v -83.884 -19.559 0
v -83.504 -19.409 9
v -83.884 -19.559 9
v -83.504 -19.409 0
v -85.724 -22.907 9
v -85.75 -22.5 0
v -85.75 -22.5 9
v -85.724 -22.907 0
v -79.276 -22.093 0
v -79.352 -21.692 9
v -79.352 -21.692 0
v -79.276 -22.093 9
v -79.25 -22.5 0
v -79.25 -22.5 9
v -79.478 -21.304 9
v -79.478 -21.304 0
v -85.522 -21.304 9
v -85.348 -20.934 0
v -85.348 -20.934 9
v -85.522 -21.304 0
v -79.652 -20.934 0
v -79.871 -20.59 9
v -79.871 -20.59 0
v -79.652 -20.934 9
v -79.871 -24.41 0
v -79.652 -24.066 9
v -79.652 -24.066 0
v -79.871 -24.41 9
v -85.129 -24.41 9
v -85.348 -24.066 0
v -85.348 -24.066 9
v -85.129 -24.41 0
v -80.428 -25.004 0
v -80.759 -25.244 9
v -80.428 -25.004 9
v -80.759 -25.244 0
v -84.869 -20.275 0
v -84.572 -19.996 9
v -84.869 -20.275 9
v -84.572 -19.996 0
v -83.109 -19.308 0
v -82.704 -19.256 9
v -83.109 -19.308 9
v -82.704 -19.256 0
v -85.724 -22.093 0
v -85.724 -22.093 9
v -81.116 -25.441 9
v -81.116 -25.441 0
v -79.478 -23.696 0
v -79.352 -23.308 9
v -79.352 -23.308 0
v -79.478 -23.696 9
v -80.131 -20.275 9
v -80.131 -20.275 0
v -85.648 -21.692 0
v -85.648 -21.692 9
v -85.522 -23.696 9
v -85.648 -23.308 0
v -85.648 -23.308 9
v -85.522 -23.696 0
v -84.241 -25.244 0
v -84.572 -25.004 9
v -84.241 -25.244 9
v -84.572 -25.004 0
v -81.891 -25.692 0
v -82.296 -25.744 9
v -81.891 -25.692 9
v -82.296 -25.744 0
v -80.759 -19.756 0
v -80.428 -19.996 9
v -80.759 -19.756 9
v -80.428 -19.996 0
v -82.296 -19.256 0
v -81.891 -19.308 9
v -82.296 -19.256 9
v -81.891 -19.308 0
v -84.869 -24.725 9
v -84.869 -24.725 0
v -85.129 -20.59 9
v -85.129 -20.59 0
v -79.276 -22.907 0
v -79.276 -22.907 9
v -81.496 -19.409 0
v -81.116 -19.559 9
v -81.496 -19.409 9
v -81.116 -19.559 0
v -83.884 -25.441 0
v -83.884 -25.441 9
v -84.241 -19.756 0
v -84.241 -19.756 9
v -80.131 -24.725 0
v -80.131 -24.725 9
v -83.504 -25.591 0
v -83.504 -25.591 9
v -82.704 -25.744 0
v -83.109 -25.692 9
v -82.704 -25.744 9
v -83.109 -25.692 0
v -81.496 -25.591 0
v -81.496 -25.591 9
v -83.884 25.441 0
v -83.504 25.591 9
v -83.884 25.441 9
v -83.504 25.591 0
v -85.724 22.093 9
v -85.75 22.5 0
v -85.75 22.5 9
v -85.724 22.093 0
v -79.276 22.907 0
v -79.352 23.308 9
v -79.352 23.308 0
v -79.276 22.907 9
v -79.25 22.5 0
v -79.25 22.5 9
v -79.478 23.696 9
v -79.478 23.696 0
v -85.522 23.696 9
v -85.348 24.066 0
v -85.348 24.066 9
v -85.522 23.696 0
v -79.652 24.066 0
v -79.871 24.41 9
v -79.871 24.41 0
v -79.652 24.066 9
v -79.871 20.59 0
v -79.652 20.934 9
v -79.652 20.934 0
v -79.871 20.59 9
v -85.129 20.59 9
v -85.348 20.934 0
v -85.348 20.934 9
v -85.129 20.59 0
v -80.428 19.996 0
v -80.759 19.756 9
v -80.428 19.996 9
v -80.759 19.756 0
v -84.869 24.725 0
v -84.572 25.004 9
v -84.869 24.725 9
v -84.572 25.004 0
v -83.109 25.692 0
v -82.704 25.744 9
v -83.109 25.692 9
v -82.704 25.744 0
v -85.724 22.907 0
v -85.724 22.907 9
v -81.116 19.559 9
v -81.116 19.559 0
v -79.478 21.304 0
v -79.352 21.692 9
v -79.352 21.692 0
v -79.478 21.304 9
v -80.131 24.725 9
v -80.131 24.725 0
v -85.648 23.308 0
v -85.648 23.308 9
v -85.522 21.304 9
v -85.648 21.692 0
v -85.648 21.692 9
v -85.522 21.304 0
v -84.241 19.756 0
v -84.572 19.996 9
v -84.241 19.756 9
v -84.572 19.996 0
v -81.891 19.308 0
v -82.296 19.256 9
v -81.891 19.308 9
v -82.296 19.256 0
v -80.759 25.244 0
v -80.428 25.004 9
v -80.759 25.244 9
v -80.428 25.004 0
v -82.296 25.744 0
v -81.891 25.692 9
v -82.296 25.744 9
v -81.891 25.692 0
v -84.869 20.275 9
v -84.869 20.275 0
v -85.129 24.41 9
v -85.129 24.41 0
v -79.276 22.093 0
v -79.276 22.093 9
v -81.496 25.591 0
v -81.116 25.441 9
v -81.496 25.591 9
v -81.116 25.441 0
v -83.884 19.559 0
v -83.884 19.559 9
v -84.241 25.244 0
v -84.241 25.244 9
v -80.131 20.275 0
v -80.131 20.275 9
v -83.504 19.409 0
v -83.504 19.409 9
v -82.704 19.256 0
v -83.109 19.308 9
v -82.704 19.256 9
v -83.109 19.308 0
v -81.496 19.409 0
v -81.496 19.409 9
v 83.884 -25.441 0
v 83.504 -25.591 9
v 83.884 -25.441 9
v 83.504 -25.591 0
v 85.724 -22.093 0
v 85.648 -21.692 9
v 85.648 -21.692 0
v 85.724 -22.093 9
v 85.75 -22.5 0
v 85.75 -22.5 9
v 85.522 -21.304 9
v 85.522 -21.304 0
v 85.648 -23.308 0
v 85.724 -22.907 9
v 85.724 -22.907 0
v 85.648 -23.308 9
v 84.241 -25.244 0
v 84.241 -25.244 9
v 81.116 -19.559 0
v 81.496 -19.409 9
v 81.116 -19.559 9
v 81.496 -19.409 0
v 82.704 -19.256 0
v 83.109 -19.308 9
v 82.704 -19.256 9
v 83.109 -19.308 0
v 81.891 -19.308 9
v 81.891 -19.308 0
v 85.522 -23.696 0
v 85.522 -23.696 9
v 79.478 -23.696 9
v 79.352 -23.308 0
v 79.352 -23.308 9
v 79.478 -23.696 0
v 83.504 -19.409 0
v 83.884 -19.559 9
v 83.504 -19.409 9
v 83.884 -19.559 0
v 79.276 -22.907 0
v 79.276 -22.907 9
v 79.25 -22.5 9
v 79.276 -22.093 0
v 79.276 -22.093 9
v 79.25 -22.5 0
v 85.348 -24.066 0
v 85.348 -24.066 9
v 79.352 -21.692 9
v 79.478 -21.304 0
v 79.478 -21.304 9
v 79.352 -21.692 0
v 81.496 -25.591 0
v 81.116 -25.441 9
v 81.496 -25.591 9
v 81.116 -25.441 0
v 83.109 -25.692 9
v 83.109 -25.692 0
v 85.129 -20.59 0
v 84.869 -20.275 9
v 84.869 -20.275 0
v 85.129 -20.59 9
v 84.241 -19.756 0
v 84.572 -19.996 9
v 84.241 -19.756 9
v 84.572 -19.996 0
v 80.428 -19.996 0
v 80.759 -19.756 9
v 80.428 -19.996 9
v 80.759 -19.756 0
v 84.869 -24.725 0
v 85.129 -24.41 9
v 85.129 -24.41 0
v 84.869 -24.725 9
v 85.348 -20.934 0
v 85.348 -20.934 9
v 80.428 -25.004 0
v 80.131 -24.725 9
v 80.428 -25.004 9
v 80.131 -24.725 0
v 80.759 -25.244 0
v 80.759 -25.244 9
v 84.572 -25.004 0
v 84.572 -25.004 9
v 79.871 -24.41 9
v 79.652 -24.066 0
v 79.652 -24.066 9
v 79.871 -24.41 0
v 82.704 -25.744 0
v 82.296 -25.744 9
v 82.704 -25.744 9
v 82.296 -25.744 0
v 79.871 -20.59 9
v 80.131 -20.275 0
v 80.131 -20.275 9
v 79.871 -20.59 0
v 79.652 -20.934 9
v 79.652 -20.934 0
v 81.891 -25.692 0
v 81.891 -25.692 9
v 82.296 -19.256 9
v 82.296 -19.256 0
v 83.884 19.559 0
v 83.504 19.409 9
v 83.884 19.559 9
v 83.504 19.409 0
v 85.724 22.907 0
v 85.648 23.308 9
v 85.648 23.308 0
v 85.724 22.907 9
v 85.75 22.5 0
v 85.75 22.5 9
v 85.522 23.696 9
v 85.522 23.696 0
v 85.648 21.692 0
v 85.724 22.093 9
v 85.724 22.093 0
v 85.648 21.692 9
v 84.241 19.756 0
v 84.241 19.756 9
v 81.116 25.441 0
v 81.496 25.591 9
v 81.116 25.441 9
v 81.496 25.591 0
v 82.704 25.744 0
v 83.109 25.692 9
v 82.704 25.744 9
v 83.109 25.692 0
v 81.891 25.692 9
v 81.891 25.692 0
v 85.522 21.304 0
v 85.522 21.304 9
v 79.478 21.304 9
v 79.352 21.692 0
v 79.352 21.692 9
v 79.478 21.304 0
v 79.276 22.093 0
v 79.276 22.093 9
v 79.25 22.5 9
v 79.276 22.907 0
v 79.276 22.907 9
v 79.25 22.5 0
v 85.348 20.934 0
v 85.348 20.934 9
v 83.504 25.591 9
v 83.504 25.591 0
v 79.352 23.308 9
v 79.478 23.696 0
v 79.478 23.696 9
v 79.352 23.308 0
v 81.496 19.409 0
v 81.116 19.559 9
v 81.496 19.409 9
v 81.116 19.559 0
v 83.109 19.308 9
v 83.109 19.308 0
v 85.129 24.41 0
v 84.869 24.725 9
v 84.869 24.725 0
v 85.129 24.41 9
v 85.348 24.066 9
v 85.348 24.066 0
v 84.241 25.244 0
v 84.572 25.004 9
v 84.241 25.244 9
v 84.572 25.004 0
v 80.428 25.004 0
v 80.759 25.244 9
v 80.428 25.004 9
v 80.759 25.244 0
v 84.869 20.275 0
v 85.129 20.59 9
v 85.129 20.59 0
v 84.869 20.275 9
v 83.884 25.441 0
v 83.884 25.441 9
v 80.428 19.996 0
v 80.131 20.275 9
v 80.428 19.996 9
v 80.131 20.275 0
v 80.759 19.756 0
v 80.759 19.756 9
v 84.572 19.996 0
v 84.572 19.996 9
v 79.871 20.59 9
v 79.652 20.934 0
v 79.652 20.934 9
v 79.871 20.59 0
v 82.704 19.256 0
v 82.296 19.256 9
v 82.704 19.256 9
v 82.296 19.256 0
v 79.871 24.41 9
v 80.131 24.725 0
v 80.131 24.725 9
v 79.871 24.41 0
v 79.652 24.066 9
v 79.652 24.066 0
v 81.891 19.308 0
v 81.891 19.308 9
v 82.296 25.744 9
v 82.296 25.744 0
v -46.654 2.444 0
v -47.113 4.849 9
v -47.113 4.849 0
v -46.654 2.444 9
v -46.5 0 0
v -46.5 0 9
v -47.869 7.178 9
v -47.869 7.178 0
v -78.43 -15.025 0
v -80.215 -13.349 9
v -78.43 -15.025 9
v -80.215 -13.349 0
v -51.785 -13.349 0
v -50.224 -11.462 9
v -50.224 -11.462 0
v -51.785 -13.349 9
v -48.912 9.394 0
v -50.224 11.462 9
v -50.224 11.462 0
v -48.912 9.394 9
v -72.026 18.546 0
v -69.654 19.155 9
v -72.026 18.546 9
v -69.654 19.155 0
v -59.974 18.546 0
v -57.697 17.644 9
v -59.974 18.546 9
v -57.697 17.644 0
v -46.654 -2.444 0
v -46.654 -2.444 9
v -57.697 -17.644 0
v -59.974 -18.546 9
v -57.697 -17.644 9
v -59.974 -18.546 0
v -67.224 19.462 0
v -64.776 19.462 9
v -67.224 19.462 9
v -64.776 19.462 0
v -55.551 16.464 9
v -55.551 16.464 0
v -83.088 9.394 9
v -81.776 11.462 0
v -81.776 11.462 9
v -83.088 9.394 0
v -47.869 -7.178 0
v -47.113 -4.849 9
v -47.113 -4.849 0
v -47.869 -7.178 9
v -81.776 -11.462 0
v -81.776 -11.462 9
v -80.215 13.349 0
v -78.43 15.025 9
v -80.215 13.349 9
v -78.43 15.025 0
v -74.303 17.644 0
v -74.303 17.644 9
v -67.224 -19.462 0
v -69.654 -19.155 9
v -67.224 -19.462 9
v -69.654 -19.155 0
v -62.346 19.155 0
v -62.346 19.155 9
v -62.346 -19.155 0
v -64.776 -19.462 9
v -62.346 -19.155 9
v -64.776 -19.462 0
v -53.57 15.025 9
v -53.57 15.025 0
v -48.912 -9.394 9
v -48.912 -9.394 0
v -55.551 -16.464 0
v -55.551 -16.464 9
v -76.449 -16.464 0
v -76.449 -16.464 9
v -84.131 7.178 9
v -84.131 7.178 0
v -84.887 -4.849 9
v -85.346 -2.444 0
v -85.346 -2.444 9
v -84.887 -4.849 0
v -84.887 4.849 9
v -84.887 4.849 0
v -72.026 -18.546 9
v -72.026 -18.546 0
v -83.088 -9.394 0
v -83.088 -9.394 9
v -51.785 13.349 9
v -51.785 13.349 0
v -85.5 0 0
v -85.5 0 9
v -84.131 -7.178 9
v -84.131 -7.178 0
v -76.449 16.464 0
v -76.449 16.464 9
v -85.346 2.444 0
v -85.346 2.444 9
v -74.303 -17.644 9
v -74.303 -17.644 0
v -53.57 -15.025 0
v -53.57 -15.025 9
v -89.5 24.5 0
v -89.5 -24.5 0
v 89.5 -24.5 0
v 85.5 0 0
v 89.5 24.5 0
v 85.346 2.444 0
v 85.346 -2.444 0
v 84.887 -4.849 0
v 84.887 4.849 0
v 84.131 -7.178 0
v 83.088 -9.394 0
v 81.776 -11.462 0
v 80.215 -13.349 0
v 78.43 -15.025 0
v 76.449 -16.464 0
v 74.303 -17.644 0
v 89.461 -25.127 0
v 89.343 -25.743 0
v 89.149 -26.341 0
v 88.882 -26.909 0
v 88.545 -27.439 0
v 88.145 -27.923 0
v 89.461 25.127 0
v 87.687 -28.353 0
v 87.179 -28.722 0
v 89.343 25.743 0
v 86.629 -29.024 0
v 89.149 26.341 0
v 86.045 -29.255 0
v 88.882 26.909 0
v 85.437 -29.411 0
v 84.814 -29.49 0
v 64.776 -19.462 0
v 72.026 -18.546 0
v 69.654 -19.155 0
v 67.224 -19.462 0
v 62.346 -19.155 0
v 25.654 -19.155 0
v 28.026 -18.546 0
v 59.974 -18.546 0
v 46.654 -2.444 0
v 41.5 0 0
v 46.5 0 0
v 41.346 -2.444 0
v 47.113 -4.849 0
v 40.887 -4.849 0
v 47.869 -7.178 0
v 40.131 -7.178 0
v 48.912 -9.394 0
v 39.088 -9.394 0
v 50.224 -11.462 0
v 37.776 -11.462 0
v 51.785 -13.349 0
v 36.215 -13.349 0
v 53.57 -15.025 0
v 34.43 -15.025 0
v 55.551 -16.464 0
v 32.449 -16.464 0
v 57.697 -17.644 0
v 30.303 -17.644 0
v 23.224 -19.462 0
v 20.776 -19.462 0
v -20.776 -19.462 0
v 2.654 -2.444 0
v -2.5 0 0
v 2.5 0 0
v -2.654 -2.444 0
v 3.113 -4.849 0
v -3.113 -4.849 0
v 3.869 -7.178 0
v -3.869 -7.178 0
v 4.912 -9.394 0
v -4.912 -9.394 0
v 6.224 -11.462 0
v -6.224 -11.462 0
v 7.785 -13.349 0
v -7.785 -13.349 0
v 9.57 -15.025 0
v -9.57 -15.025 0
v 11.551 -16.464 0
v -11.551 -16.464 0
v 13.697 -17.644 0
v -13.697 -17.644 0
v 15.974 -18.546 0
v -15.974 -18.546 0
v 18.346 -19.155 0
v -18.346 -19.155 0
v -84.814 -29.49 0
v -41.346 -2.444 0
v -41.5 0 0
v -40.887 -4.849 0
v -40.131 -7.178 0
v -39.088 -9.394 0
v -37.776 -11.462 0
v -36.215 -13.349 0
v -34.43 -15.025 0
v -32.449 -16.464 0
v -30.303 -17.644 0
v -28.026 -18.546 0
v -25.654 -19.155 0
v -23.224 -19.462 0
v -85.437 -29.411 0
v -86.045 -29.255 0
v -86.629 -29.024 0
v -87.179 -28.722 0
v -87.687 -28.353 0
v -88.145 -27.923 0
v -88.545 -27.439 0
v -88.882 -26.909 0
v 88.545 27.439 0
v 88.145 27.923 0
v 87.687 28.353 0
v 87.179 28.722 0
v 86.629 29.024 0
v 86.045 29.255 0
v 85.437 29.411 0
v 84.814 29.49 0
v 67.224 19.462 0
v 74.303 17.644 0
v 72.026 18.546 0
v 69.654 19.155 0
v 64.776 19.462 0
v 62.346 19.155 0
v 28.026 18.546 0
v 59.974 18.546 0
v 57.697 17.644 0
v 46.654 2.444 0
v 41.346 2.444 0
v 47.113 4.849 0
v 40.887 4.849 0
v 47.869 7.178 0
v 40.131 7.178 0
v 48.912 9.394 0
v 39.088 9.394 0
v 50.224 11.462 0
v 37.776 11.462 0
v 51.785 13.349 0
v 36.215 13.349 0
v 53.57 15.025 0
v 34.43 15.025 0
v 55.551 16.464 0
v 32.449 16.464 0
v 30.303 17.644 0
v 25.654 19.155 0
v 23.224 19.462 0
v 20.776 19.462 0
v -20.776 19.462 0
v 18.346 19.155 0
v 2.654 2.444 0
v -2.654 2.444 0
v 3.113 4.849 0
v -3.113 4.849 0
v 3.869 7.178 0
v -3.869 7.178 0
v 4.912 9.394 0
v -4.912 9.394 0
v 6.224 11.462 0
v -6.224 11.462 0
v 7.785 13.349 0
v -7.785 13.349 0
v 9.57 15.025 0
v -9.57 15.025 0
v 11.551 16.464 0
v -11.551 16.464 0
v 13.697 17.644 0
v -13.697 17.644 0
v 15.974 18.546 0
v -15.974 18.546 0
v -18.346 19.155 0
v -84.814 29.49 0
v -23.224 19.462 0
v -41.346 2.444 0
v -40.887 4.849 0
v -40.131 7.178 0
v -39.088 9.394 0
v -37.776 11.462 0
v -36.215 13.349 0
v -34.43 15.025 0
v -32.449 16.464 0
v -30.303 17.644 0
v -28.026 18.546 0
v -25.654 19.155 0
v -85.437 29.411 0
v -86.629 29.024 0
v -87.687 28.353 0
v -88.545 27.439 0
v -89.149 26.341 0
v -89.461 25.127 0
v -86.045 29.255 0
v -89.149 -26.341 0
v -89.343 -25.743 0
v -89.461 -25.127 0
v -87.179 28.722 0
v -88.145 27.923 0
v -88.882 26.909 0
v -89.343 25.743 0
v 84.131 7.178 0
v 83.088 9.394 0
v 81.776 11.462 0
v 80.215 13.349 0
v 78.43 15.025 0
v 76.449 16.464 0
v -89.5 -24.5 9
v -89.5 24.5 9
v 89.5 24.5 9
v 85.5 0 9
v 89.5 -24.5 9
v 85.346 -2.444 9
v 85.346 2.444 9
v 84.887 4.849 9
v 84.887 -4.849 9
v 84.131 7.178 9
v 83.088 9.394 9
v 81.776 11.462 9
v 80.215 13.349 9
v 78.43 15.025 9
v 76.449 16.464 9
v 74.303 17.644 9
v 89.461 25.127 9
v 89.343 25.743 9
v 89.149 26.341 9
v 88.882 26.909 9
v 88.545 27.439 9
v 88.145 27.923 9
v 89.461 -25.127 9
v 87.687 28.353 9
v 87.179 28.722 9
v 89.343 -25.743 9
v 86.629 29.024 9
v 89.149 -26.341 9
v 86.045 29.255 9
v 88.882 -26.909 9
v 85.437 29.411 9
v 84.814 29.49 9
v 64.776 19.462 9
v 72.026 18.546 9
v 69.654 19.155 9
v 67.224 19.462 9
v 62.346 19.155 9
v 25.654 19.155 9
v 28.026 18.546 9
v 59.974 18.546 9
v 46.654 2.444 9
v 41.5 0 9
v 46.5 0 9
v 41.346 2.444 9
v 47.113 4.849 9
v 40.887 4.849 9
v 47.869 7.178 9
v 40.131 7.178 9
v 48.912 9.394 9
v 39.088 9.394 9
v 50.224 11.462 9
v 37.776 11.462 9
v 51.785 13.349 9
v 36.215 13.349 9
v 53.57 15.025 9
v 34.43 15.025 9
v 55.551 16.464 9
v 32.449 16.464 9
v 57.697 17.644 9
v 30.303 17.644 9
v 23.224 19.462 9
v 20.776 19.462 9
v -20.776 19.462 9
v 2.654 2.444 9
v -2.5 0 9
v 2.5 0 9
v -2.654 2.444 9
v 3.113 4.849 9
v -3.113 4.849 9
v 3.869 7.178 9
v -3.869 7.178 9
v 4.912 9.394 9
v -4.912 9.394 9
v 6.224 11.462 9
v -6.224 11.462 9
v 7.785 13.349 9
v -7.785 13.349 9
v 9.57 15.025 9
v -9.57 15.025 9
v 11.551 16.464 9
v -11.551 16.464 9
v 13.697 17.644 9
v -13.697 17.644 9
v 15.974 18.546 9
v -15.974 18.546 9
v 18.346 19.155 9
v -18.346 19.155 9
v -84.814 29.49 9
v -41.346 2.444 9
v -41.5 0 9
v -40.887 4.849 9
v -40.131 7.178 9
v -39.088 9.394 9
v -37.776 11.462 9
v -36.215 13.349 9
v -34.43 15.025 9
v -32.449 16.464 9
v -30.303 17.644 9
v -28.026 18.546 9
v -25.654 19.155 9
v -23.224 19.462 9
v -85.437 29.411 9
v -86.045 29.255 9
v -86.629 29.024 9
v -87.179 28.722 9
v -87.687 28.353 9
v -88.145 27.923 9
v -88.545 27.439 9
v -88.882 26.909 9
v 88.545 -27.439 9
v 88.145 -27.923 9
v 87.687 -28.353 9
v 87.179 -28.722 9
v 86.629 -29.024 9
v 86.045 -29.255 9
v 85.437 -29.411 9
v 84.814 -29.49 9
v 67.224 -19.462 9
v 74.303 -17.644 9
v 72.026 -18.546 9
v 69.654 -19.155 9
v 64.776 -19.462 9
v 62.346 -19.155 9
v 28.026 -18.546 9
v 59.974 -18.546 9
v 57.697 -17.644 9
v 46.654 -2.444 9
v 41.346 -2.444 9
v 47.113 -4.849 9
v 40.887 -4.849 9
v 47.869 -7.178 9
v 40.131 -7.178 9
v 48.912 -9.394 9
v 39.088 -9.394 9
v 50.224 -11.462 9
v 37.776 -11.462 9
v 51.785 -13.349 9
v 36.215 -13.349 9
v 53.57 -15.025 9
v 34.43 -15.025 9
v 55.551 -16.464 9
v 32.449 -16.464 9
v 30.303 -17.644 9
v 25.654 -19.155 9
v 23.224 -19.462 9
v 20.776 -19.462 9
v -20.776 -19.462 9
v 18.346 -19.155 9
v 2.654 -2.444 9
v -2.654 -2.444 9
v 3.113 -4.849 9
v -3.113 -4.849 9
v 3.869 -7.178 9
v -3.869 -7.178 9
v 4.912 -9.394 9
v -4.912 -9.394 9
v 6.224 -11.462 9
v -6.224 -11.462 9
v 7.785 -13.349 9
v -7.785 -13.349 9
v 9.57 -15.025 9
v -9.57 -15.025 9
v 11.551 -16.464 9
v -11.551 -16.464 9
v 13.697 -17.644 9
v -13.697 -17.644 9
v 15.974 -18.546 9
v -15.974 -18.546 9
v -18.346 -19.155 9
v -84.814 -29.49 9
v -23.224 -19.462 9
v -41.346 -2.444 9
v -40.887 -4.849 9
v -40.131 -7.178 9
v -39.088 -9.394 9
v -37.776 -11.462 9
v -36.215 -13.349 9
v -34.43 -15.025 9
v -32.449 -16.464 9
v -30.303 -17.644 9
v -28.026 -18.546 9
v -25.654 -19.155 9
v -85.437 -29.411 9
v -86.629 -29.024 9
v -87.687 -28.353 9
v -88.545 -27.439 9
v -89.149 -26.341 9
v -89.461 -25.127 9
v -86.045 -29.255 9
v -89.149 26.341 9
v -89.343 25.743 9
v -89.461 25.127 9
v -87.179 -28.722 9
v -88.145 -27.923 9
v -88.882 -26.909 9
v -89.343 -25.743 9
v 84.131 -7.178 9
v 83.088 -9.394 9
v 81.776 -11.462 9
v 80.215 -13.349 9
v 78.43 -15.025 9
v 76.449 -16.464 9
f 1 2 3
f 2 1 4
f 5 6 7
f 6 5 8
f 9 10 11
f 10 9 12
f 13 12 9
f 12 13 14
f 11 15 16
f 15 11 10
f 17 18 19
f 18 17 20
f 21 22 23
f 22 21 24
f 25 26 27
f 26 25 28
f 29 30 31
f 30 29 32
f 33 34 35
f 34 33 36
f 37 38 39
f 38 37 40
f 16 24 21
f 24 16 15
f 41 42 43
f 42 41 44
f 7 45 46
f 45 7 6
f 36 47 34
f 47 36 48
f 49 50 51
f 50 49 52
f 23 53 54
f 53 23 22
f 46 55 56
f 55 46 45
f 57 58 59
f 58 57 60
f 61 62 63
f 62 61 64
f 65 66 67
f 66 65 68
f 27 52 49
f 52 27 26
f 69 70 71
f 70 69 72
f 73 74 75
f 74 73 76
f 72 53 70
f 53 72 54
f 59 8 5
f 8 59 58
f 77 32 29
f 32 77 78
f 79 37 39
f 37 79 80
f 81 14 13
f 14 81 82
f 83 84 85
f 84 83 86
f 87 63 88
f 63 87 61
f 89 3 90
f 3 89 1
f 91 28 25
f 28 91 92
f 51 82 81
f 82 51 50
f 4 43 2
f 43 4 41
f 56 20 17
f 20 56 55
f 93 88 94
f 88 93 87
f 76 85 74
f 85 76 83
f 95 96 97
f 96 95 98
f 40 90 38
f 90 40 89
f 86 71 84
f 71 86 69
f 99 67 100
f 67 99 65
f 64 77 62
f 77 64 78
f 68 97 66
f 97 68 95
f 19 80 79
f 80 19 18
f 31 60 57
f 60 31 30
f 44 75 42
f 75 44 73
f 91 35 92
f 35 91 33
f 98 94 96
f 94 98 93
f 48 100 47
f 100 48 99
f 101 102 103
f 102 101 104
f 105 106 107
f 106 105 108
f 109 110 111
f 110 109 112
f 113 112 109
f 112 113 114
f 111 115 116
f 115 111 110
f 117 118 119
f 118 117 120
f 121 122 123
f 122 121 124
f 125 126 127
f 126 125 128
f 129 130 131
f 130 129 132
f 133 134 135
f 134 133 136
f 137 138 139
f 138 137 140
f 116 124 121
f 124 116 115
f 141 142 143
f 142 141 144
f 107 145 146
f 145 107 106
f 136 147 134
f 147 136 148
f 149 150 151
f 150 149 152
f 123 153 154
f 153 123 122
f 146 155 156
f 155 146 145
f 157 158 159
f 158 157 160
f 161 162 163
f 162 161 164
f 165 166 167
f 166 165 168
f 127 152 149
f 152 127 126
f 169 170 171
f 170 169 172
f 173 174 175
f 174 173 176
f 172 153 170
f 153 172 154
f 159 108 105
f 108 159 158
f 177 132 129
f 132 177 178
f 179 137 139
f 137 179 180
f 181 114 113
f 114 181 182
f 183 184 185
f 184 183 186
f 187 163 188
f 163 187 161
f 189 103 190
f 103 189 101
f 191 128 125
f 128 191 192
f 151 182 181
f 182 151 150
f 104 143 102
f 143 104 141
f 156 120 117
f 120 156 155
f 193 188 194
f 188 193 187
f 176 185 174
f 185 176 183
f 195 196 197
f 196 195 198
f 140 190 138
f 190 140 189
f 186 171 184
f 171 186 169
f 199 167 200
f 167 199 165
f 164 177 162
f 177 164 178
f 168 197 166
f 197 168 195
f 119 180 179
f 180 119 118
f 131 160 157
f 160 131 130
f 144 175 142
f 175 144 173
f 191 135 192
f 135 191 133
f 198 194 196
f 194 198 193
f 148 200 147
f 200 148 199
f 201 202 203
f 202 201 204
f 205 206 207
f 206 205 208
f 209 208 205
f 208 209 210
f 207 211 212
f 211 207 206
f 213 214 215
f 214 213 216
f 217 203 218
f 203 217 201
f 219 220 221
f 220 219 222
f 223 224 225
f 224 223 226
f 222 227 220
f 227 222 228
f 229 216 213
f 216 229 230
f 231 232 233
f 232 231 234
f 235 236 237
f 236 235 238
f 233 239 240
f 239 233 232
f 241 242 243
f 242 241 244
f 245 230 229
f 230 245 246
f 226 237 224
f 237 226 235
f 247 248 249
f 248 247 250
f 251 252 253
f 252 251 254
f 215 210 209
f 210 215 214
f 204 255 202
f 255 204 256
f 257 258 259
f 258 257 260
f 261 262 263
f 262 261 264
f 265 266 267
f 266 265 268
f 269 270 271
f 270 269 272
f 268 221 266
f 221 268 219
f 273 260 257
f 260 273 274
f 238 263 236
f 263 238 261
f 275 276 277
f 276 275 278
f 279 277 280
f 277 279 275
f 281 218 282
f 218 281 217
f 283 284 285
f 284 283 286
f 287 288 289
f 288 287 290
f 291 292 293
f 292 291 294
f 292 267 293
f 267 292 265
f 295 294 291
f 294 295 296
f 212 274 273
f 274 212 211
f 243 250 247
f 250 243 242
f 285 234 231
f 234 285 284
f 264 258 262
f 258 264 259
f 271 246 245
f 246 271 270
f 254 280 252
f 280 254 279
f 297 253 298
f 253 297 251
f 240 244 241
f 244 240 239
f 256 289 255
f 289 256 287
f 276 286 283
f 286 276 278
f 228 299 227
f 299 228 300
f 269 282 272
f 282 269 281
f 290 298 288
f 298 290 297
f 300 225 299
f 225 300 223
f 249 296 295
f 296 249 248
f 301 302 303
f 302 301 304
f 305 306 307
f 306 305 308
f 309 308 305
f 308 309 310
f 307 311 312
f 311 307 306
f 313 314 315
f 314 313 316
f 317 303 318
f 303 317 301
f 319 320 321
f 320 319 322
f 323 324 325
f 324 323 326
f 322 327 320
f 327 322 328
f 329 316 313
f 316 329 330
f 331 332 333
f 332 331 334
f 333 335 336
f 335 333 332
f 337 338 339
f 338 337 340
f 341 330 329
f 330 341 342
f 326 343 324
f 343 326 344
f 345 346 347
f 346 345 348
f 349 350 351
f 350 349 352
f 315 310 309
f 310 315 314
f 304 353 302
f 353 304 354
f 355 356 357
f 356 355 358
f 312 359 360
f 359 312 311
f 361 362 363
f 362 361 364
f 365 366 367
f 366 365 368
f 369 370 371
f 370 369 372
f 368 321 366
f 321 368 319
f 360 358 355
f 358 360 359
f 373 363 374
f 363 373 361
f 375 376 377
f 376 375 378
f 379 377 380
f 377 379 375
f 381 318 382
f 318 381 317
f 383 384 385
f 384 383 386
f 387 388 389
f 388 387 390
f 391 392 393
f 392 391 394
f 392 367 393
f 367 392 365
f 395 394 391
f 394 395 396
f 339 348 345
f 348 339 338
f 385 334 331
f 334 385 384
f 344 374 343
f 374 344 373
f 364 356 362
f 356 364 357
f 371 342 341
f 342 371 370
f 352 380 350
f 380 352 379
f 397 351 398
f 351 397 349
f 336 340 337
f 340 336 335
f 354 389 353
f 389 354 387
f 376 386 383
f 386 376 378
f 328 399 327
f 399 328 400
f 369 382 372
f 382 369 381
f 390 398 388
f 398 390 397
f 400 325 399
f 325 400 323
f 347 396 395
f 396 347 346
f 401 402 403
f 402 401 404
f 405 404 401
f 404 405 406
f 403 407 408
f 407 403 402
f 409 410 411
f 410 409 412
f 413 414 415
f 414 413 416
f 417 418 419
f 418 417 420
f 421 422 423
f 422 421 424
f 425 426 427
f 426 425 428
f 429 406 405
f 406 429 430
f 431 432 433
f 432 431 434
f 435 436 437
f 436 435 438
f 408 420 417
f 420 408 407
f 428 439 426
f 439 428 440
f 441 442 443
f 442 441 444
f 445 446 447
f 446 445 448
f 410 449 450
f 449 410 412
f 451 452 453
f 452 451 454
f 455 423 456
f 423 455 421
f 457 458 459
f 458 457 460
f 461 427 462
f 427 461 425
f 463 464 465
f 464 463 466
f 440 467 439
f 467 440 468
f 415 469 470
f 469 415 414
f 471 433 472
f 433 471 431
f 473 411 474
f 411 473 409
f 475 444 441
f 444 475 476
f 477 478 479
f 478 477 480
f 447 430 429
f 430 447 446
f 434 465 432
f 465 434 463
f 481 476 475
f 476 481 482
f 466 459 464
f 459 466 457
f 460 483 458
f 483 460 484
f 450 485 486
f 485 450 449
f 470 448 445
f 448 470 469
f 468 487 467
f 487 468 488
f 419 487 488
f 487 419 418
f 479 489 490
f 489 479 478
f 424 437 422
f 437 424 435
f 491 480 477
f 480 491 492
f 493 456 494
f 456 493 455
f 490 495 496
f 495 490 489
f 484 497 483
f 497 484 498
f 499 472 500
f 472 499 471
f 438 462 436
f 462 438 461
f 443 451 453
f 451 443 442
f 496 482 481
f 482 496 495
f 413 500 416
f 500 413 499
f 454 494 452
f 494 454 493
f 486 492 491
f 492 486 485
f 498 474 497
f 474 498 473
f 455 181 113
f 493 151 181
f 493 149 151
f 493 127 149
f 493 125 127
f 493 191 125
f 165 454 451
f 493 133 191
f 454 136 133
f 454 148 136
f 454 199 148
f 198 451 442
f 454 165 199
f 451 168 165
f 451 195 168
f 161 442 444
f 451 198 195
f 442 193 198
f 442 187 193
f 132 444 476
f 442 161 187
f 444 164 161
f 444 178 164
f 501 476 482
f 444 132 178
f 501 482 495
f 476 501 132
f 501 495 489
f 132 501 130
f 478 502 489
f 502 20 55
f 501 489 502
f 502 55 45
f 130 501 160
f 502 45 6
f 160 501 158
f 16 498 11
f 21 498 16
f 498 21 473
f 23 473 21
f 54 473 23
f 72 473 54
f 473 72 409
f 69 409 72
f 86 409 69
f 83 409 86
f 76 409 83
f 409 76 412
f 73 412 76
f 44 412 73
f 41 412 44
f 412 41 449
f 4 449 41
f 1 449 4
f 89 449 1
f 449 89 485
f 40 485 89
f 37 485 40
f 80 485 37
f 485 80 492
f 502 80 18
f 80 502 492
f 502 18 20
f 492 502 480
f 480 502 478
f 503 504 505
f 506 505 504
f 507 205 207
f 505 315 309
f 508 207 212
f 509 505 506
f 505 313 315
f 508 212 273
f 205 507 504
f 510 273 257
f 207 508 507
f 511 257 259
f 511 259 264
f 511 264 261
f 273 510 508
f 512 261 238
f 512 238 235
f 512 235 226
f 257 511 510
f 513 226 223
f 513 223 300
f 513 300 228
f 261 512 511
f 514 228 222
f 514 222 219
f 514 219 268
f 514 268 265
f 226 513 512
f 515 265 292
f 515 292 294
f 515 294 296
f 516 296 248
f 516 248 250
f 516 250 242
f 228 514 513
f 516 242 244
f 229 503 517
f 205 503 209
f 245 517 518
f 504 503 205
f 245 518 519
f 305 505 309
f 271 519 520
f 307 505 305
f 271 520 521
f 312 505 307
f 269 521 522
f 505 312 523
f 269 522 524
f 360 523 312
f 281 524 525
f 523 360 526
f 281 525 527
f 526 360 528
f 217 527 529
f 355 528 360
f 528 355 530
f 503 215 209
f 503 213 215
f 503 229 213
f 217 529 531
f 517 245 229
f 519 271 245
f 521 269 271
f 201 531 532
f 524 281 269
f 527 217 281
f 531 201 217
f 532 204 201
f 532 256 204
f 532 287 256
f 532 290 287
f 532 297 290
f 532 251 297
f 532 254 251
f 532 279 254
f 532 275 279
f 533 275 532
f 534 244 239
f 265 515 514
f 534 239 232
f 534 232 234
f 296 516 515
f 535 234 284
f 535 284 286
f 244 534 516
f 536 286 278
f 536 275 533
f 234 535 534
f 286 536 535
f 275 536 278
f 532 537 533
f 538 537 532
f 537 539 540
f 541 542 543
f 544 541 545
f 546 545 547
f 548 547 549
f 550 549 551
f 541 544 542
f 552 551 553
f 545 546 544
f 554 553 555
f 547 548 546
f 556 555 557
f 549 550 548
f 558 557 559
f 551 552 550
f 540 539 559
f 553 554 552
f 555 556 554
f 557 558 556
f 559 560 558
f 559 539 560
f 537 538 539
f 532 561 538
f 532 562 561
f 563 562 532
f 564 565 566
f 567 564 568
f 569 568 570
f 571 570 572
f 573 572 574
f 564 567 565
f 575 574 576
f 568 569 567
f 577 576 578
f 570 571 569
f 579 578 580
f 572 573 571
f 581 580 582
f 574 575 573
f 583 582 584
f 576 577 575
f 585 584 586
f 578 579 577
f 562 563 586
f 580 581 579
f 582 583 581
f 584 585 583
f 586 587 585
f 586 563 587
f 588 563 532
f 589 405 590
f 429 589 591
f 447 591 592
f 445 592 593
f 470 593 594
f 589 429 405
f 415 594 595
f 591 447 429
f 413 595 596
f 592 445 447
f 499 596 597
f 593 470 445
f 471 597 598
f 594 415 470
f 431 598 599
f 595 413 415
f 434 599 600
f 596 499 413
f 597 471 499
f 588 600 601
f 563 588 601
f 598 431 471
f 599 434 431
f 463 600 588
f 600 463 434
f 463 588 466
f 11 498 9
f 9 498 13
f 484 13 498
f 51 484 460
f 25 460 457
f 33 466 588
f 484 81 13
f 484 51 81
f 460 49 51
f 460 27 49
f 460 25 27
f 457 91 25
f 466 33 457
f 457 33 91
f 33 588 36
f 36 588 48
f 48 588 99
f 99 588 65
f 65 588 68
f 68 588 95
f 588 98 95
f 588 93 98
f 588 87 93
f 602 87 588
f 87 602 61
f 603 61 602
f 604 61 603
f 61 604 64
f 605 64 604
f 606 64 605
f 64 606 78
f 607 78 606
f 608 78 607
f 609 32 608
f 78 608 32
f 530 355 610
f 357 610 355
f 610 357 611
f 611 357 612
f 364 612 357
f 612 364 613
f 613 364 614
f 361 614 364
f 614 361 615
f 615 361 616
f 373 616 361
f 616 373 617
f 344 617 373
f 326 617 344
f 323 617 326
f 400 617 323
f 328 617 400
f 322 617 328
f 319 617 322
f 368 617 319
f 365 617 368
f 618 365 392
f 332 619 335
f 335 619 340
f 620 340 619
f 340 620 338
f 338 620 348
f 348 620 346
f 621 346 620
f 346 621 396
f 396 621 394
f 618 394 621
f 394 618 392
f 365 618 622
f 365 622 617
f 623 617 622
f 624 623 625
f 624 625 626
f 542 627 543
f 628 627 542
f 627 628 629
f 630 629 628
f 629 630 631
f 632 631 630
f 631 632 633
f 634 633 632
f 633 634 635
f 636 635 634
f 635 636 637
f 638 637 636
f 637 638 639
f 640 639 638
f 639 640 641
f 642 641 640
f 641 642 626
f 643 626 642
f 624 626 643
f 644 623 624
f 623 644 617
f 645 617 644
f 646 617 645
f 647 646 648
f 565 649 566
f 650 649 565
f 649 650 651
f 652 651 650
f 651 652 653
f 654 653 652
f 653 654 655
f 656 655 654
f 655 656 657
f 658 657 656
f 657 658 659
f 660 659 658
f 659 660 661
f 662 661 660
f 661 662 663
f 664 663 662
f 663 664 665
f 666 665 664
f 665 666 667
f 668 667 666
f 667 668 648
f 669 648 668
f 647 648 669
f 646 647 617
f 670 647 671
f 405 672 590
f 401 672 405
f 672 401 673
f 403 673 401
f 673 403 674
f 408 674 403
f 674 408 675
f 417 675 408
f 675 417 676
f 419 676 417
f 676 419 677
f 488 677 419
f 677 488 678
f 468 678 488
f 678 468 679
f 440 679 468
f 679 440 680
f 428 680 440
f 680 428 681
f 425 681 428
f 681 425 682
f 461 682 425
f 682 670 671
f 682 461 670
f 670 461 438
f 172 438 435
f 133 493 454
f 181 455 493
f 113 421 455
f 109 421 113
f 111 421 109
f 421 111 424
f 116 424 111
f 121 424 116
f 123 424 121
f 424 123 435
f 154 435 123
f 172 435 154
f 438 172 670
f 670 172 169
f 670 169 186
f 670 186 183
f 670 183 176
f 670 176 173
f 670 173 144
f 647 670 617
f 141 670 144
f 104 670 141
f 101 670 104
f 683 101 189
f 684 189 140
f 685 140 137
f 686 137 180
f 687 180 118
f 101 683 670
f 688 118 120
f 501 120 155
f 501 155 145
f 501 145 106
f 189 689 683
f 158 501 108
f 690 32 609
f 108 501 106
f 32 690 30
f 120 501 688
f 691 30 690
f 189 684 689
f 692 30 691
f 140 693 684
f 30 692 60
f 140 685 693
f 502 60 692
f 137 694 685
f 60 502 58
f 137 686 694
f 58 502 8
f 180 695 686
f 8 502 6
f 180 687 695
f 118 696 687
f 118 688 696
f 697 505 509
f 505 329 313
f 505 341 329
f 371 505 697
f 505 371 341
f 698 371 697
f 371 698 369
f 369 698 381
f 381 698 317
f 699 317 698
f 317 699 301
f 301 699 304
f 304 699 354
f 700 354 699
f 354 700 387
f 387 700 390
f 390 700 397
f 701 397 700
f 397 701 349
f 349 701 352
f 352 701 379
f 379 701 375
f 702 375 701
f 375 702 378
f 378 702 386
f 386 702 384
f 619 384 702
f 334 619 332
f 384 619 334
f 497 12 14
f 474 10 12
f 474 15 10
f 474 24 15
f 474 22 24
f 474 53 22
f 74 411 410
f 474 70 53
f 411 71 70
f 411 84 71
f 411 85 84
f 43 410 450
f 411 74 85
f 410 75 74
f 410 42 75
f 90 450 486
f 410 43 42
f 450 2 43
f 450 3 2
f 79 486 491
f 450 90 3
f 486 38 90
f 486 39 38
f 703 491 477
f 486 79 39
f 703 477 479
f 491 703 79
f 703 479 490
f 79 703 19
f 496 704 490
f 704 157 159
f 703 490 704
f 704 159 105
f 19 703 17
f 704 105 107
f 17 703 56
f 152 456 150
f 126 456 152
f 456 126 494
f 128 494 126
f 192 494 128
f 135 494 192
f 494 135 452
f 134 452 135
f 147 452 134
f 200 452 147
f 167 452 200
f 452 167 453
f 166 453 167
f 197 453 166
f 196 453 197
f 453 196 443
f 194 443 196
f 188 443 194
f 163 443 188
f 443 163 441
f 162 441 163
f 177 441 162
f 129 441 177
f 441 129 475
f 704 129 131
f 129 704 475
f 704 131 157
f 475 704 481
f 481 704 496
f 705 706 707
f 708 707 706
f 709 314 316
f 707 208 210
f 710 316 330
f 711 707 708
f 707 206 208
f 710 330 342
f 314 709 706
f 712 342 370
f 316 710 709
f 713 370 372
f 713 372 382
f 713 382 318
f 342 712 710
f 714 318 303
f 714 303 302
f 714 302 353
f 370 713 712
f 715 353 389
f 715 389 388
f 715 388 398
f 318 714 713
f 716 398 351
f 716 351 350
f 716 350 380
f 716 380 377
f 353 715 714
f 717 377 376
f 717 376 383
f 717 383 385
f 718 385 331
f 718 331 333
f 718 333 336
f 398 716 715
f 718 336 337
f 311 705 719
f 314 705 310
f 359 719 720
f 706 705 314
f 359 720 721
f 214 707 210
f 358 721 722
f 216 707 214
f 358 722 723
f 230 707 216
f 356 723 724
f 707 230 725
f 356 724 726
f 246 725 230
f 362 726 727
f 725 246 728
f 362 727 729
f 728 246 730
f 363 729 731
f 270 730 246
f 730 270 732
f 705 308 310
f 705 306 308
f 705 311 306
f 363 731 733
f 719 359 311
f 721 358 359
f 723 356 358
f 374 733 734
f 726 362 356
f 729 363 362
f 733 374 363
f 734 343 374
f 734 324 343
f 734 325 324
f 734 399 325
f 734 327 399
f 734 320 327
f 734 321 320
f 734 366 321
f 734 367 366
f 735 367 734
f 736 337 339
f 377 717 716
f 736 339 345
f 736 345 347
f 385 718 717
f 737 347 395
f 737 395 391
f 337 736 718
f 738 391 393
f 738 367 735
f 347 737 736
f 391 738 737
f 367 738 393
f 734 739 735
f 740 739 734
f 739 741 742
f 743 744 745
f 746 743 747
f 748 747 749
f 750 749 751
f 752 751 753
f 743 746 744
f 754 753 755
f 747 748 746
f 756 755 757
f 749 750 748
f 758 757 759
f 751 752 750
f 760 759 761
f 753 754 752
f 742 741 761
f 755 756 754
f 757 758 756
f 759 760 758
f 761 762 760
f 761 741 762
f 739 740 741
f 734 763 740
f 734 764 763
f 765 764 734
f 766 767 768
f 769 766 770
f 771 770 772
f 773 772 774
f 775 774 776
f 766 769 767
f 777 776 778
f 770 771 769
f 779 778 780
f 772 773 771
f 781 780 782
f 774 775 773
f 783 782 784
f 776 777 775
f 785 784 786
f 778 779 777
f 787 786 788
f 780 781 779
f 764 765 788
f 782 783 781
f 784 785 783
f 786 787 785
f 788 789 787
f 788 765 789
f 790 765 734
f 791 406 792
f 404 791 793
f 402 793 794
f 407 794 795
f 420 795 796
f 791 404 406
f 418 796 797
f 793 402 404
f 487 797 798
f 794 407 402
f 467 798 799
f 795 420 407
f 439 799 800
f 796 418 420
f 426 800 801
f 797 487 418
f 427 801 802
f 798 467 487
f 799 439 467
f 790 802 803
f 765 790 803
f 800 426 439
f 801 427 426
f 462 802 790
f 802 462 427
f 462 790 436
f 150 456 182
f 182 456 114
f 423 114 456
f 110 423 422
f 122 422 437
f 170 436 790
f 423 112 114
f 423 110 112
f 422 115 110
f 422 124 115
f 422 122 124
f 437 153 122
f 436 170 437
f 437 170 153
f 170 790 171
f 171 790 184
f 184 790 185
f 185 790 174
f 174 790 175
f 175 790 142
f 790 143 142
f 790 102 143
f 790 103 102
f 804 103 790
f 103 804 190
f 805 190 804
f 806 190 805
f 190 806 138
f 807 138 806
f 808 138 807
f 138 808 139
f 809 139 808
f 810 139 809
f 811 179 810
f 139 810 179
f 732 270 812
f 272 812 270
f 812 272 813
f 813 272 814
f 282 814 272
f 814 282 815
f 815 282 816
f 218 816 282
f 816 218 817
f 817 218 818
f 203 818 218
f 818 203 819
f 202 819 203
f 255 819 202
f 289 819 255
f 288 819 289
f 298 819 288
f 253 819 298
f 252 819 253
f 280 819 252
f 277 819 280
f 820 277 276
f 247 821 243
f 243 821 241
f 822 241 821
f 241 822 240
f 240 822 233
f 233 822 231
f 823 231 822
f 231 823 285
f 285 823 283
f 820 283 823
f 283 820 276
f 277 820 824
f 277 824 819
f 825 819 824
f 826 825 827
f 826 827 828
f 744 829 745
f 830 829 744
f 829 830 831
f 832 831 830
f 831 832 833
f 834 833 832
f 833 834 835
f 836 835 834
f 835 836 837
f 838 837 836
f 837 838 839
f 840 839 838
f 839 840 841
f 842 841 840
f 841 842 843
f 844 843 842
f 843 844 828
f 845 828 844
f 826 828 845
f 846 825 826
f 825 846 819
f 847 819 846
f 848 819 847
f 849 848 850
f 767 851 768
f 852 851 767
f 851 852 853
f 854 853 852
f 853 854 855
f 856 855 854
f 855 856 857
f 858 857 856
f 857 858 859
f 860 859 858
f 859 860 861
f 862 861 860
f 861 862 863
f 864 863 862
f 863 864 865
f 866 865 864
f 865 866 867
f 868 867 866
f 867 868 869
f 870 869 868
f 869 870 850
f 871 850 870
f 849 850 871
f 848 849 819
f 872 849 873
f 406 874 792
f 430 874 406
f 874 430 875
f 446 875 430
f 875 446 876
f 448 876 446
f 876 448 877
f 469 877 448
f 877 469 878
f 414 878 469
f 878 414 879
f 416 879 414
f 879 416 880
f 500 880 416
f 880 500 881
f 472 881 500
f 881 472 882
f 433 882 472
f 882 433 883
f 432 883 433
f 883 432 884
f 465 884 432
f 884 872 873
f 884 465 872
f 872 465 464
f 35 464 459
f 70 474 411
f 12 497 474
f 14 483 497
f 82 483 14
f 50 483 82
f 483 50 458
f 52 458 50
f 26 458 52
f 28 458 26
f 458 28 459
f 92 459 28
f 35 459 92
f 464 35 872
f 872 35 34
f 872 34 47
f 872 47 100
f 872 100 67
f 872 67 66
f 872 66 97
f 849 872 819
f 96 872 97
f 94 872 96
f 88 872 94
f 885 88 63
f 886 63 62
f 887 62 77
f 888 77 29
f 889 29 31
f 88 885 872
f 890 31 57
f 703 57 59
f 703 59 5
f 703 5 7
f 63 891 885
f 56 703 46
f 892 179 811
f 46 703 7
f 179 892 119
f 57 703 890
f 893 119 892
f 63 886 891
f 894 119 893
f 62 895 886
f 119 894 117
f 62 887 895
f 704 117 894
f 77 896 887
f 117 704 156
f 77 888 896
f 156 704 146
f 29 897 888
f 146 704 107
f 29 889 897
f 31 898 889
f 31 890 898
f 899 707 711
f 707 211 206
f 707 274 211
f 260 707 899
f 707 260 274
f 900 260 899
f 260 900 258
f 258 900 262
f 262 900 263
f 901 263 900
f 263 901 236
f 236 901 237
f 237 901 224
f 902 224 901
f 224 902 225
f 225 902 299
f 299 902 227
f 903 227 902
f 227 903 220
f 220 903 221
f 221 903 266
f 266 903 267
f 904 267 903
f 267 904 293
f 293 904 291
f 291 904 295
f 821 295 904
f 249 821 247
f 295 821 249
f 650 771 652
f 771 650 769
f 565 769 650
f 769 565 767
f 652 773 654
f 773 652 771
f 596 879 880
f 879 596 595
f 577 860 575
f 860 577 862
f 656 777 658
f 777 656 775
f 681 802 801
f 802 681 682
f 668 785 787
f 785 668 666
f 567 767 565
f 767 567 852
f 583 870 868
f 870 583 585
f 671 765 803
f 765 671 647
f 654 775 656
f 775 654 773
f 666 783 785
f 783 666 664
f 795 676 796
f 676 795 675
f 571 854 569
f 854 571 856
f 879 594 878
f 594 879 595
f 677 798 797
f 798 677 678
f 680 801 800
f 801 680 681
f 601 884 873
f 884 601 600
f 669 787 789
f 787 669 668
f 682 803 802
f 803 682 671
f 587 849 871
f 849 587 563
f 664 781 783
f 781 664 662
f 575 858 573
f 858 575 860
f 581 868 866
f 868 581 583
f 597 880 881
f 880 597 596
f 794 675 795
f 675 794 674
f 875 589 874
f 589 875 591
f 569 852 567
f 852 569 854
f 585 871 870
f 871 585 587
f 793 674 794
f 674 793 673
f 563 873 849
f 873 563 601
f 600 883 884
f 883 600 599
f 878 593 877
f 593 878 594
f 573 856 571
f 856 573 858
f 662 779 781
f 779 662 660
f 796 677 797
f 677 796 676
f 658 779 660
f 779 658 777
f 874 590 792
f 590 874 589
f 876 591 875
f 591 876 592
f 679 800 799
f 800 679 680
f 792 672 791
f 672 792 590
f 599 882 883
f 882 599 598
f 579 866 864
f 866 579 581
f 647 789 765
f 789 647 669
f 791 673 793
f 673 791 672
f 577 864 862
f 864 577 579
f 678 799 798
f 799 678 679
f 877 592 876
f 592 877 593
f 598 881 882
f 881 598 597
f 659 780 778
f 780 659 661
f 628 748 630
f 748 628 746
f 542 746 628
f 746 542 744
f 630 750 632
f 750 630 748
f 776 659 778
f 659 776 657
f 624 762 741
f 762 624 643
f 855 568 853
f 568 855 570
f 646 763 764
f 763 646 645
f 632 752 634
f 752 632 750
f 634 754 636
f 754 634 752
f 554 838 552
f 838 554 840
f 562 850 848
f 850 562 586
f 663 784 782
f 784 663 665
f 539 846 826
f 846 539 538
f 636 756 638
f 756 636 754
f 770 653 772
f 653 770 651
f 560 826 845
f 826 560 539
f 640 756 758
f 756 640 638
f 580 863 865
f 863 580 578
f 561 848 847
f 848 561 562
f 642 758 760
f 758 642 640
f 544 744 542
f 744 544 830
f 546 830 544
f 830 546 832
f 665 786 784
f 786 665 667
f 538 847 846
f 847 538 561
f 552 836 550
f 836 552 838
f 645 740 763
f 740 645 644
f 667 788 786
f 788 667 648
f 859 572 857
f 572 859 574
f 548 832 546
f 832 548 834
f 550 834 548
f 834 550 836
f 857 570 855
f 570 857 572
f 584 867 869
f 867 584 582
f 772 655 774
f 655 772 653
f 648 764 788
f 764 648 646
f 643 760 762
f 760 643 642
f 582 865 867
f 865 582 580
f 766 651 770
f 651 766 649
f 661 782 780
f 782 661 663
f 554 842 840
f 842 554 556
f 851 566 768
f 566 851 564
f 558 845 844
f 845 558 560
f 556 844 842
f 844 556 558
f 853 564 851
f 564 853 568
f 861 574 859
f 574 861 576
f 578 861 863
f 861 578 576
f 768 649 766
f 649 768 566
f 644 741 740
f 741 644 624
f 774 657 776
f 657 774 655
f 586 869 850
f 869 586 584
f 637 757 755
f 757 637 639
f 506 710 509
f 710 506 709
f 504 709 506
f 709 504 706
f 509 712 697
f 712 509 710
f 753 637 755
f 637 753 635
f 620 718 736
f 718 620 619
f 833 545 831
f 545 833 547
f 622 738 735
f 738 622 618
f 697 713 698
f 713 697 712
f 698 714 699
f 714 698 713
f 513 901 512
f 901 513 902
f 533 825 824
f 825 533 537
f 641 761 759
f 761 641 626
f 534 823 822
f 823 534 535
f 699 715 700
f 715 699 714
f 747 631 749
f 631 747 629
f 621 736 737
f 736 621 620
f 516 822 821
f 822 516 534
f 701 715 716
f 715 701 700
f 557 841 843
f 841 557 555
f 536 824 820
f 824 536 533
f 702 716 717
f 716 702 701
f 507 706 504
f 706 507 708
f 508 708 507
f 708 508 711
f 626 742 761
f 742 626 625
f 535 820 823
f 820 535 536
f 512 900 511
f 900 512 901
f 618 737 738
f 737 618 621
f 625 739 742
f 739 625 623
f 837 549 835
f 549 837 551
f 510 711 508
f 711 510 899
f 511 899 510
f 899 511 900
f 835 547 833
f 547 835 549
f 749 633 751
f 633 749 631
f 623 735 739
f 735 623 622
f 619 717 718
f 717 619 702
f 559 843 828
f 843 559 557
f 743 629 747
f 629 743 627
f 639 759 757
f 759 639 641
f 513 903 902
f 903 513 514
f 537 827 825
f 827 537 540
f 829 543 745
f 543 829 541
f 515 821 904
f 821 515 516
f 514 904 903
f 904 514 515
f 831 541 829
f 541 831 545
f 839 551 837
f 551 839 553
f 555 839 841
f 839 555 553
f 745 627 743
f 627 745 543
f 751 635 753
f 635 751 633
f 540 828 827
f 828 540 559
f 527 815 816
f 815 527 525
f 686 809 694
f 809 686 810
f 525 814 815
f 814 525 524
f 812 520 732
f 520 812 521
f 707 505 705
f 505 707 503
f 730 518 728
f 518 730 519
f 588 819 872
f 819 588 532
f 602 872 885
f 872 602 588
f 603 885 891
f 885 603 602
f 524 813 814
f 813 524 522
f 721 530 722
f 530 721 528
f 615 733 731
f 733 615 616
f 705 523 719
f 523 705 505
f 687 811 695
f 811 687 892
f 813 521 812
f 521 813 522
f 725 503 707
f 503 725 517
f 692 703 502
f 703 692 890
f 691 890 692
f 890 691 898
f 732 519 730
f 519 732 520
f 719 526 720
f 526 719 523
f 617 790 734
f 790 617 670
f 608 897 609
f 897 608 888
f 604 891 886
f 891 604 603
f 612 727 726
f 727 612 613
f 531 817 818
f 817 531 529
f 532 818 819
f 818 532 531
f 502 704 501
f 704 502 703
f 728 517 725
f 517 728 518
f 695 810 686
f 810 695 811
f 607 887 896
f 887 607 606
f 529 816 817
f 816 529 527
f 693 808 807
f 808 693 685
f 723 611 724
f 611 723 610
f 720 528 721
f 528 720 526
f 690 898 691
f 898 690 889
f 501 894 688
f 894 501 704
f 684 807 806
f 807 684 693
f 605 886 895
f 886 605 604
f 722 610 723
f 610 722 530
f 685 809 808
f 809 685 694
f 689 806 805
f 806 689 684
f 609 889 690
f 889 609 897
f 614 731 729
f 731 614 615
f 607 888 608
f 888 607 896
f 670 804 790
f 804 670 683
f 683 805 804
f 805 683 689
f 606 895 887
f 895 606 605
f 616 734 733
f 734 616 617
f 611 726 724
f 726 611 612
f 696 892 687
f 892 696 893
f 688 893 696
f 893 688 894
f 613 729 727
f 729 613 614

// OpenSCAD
$fn = 50;


difference() {
	union() {
		hull() {
			translate(v = [-84.5000000000, 24.5000000000, 0]) {
				cylinder(h = 9, r = 5);
			}
			translate(v = [84.5000000000, 24.5000000000, 0]) {
				cylinder(h = 9, r = 5);
			}
			translate(v = [-84.5000000000, -24.5000000000, 0]) {
				cylinder(h = 9, r = 5);
			}
			translate(v = [84.5000000000, -24.5000000000, 0]) {
				cylinder(h = 9, r = 5);
			}
		}
	}
	union() {
		#translate(v = [-82.5000000000, -22.5000000000, -100.0000000000]) {
			cylinder(h = 200, r = 3.2500000000);
		}
		#translate(v = [-82.5000000000, 22.5000000000, -100.0000000000]) {
			cylinder(h = 200, r = 3.2500000000);
		}
		#translate(v = [82.5000000000, -22.5000000000, -100.0000000000]) {
			cylinder(h = 200, r = 3.2500000000);
		}
		#translate(v = [82.5000000000, 22.5000000000, -100.0000000000]) {
			cylinder(h = 200, r = 3.2500000000);
		}
		#translate(v = [-66.0000000000, 0, 0]) {
			cylinder(h = 9, r = 19.5000000000);
		}
		#translate(v = [-22.0000000000, 0, 0]) {
			cylinder(h = 9, r = 19.5000000000);
		}
		#translate(v = [22.0000000000, 0, 0]) {
			cylinder(h = 9, r = 19.5000000000);
		}
		#translate(v = [66.0000000000, 0, 0]) {
			cylinder(h = 9, r = 19.5000000000);
		}
	}
}
